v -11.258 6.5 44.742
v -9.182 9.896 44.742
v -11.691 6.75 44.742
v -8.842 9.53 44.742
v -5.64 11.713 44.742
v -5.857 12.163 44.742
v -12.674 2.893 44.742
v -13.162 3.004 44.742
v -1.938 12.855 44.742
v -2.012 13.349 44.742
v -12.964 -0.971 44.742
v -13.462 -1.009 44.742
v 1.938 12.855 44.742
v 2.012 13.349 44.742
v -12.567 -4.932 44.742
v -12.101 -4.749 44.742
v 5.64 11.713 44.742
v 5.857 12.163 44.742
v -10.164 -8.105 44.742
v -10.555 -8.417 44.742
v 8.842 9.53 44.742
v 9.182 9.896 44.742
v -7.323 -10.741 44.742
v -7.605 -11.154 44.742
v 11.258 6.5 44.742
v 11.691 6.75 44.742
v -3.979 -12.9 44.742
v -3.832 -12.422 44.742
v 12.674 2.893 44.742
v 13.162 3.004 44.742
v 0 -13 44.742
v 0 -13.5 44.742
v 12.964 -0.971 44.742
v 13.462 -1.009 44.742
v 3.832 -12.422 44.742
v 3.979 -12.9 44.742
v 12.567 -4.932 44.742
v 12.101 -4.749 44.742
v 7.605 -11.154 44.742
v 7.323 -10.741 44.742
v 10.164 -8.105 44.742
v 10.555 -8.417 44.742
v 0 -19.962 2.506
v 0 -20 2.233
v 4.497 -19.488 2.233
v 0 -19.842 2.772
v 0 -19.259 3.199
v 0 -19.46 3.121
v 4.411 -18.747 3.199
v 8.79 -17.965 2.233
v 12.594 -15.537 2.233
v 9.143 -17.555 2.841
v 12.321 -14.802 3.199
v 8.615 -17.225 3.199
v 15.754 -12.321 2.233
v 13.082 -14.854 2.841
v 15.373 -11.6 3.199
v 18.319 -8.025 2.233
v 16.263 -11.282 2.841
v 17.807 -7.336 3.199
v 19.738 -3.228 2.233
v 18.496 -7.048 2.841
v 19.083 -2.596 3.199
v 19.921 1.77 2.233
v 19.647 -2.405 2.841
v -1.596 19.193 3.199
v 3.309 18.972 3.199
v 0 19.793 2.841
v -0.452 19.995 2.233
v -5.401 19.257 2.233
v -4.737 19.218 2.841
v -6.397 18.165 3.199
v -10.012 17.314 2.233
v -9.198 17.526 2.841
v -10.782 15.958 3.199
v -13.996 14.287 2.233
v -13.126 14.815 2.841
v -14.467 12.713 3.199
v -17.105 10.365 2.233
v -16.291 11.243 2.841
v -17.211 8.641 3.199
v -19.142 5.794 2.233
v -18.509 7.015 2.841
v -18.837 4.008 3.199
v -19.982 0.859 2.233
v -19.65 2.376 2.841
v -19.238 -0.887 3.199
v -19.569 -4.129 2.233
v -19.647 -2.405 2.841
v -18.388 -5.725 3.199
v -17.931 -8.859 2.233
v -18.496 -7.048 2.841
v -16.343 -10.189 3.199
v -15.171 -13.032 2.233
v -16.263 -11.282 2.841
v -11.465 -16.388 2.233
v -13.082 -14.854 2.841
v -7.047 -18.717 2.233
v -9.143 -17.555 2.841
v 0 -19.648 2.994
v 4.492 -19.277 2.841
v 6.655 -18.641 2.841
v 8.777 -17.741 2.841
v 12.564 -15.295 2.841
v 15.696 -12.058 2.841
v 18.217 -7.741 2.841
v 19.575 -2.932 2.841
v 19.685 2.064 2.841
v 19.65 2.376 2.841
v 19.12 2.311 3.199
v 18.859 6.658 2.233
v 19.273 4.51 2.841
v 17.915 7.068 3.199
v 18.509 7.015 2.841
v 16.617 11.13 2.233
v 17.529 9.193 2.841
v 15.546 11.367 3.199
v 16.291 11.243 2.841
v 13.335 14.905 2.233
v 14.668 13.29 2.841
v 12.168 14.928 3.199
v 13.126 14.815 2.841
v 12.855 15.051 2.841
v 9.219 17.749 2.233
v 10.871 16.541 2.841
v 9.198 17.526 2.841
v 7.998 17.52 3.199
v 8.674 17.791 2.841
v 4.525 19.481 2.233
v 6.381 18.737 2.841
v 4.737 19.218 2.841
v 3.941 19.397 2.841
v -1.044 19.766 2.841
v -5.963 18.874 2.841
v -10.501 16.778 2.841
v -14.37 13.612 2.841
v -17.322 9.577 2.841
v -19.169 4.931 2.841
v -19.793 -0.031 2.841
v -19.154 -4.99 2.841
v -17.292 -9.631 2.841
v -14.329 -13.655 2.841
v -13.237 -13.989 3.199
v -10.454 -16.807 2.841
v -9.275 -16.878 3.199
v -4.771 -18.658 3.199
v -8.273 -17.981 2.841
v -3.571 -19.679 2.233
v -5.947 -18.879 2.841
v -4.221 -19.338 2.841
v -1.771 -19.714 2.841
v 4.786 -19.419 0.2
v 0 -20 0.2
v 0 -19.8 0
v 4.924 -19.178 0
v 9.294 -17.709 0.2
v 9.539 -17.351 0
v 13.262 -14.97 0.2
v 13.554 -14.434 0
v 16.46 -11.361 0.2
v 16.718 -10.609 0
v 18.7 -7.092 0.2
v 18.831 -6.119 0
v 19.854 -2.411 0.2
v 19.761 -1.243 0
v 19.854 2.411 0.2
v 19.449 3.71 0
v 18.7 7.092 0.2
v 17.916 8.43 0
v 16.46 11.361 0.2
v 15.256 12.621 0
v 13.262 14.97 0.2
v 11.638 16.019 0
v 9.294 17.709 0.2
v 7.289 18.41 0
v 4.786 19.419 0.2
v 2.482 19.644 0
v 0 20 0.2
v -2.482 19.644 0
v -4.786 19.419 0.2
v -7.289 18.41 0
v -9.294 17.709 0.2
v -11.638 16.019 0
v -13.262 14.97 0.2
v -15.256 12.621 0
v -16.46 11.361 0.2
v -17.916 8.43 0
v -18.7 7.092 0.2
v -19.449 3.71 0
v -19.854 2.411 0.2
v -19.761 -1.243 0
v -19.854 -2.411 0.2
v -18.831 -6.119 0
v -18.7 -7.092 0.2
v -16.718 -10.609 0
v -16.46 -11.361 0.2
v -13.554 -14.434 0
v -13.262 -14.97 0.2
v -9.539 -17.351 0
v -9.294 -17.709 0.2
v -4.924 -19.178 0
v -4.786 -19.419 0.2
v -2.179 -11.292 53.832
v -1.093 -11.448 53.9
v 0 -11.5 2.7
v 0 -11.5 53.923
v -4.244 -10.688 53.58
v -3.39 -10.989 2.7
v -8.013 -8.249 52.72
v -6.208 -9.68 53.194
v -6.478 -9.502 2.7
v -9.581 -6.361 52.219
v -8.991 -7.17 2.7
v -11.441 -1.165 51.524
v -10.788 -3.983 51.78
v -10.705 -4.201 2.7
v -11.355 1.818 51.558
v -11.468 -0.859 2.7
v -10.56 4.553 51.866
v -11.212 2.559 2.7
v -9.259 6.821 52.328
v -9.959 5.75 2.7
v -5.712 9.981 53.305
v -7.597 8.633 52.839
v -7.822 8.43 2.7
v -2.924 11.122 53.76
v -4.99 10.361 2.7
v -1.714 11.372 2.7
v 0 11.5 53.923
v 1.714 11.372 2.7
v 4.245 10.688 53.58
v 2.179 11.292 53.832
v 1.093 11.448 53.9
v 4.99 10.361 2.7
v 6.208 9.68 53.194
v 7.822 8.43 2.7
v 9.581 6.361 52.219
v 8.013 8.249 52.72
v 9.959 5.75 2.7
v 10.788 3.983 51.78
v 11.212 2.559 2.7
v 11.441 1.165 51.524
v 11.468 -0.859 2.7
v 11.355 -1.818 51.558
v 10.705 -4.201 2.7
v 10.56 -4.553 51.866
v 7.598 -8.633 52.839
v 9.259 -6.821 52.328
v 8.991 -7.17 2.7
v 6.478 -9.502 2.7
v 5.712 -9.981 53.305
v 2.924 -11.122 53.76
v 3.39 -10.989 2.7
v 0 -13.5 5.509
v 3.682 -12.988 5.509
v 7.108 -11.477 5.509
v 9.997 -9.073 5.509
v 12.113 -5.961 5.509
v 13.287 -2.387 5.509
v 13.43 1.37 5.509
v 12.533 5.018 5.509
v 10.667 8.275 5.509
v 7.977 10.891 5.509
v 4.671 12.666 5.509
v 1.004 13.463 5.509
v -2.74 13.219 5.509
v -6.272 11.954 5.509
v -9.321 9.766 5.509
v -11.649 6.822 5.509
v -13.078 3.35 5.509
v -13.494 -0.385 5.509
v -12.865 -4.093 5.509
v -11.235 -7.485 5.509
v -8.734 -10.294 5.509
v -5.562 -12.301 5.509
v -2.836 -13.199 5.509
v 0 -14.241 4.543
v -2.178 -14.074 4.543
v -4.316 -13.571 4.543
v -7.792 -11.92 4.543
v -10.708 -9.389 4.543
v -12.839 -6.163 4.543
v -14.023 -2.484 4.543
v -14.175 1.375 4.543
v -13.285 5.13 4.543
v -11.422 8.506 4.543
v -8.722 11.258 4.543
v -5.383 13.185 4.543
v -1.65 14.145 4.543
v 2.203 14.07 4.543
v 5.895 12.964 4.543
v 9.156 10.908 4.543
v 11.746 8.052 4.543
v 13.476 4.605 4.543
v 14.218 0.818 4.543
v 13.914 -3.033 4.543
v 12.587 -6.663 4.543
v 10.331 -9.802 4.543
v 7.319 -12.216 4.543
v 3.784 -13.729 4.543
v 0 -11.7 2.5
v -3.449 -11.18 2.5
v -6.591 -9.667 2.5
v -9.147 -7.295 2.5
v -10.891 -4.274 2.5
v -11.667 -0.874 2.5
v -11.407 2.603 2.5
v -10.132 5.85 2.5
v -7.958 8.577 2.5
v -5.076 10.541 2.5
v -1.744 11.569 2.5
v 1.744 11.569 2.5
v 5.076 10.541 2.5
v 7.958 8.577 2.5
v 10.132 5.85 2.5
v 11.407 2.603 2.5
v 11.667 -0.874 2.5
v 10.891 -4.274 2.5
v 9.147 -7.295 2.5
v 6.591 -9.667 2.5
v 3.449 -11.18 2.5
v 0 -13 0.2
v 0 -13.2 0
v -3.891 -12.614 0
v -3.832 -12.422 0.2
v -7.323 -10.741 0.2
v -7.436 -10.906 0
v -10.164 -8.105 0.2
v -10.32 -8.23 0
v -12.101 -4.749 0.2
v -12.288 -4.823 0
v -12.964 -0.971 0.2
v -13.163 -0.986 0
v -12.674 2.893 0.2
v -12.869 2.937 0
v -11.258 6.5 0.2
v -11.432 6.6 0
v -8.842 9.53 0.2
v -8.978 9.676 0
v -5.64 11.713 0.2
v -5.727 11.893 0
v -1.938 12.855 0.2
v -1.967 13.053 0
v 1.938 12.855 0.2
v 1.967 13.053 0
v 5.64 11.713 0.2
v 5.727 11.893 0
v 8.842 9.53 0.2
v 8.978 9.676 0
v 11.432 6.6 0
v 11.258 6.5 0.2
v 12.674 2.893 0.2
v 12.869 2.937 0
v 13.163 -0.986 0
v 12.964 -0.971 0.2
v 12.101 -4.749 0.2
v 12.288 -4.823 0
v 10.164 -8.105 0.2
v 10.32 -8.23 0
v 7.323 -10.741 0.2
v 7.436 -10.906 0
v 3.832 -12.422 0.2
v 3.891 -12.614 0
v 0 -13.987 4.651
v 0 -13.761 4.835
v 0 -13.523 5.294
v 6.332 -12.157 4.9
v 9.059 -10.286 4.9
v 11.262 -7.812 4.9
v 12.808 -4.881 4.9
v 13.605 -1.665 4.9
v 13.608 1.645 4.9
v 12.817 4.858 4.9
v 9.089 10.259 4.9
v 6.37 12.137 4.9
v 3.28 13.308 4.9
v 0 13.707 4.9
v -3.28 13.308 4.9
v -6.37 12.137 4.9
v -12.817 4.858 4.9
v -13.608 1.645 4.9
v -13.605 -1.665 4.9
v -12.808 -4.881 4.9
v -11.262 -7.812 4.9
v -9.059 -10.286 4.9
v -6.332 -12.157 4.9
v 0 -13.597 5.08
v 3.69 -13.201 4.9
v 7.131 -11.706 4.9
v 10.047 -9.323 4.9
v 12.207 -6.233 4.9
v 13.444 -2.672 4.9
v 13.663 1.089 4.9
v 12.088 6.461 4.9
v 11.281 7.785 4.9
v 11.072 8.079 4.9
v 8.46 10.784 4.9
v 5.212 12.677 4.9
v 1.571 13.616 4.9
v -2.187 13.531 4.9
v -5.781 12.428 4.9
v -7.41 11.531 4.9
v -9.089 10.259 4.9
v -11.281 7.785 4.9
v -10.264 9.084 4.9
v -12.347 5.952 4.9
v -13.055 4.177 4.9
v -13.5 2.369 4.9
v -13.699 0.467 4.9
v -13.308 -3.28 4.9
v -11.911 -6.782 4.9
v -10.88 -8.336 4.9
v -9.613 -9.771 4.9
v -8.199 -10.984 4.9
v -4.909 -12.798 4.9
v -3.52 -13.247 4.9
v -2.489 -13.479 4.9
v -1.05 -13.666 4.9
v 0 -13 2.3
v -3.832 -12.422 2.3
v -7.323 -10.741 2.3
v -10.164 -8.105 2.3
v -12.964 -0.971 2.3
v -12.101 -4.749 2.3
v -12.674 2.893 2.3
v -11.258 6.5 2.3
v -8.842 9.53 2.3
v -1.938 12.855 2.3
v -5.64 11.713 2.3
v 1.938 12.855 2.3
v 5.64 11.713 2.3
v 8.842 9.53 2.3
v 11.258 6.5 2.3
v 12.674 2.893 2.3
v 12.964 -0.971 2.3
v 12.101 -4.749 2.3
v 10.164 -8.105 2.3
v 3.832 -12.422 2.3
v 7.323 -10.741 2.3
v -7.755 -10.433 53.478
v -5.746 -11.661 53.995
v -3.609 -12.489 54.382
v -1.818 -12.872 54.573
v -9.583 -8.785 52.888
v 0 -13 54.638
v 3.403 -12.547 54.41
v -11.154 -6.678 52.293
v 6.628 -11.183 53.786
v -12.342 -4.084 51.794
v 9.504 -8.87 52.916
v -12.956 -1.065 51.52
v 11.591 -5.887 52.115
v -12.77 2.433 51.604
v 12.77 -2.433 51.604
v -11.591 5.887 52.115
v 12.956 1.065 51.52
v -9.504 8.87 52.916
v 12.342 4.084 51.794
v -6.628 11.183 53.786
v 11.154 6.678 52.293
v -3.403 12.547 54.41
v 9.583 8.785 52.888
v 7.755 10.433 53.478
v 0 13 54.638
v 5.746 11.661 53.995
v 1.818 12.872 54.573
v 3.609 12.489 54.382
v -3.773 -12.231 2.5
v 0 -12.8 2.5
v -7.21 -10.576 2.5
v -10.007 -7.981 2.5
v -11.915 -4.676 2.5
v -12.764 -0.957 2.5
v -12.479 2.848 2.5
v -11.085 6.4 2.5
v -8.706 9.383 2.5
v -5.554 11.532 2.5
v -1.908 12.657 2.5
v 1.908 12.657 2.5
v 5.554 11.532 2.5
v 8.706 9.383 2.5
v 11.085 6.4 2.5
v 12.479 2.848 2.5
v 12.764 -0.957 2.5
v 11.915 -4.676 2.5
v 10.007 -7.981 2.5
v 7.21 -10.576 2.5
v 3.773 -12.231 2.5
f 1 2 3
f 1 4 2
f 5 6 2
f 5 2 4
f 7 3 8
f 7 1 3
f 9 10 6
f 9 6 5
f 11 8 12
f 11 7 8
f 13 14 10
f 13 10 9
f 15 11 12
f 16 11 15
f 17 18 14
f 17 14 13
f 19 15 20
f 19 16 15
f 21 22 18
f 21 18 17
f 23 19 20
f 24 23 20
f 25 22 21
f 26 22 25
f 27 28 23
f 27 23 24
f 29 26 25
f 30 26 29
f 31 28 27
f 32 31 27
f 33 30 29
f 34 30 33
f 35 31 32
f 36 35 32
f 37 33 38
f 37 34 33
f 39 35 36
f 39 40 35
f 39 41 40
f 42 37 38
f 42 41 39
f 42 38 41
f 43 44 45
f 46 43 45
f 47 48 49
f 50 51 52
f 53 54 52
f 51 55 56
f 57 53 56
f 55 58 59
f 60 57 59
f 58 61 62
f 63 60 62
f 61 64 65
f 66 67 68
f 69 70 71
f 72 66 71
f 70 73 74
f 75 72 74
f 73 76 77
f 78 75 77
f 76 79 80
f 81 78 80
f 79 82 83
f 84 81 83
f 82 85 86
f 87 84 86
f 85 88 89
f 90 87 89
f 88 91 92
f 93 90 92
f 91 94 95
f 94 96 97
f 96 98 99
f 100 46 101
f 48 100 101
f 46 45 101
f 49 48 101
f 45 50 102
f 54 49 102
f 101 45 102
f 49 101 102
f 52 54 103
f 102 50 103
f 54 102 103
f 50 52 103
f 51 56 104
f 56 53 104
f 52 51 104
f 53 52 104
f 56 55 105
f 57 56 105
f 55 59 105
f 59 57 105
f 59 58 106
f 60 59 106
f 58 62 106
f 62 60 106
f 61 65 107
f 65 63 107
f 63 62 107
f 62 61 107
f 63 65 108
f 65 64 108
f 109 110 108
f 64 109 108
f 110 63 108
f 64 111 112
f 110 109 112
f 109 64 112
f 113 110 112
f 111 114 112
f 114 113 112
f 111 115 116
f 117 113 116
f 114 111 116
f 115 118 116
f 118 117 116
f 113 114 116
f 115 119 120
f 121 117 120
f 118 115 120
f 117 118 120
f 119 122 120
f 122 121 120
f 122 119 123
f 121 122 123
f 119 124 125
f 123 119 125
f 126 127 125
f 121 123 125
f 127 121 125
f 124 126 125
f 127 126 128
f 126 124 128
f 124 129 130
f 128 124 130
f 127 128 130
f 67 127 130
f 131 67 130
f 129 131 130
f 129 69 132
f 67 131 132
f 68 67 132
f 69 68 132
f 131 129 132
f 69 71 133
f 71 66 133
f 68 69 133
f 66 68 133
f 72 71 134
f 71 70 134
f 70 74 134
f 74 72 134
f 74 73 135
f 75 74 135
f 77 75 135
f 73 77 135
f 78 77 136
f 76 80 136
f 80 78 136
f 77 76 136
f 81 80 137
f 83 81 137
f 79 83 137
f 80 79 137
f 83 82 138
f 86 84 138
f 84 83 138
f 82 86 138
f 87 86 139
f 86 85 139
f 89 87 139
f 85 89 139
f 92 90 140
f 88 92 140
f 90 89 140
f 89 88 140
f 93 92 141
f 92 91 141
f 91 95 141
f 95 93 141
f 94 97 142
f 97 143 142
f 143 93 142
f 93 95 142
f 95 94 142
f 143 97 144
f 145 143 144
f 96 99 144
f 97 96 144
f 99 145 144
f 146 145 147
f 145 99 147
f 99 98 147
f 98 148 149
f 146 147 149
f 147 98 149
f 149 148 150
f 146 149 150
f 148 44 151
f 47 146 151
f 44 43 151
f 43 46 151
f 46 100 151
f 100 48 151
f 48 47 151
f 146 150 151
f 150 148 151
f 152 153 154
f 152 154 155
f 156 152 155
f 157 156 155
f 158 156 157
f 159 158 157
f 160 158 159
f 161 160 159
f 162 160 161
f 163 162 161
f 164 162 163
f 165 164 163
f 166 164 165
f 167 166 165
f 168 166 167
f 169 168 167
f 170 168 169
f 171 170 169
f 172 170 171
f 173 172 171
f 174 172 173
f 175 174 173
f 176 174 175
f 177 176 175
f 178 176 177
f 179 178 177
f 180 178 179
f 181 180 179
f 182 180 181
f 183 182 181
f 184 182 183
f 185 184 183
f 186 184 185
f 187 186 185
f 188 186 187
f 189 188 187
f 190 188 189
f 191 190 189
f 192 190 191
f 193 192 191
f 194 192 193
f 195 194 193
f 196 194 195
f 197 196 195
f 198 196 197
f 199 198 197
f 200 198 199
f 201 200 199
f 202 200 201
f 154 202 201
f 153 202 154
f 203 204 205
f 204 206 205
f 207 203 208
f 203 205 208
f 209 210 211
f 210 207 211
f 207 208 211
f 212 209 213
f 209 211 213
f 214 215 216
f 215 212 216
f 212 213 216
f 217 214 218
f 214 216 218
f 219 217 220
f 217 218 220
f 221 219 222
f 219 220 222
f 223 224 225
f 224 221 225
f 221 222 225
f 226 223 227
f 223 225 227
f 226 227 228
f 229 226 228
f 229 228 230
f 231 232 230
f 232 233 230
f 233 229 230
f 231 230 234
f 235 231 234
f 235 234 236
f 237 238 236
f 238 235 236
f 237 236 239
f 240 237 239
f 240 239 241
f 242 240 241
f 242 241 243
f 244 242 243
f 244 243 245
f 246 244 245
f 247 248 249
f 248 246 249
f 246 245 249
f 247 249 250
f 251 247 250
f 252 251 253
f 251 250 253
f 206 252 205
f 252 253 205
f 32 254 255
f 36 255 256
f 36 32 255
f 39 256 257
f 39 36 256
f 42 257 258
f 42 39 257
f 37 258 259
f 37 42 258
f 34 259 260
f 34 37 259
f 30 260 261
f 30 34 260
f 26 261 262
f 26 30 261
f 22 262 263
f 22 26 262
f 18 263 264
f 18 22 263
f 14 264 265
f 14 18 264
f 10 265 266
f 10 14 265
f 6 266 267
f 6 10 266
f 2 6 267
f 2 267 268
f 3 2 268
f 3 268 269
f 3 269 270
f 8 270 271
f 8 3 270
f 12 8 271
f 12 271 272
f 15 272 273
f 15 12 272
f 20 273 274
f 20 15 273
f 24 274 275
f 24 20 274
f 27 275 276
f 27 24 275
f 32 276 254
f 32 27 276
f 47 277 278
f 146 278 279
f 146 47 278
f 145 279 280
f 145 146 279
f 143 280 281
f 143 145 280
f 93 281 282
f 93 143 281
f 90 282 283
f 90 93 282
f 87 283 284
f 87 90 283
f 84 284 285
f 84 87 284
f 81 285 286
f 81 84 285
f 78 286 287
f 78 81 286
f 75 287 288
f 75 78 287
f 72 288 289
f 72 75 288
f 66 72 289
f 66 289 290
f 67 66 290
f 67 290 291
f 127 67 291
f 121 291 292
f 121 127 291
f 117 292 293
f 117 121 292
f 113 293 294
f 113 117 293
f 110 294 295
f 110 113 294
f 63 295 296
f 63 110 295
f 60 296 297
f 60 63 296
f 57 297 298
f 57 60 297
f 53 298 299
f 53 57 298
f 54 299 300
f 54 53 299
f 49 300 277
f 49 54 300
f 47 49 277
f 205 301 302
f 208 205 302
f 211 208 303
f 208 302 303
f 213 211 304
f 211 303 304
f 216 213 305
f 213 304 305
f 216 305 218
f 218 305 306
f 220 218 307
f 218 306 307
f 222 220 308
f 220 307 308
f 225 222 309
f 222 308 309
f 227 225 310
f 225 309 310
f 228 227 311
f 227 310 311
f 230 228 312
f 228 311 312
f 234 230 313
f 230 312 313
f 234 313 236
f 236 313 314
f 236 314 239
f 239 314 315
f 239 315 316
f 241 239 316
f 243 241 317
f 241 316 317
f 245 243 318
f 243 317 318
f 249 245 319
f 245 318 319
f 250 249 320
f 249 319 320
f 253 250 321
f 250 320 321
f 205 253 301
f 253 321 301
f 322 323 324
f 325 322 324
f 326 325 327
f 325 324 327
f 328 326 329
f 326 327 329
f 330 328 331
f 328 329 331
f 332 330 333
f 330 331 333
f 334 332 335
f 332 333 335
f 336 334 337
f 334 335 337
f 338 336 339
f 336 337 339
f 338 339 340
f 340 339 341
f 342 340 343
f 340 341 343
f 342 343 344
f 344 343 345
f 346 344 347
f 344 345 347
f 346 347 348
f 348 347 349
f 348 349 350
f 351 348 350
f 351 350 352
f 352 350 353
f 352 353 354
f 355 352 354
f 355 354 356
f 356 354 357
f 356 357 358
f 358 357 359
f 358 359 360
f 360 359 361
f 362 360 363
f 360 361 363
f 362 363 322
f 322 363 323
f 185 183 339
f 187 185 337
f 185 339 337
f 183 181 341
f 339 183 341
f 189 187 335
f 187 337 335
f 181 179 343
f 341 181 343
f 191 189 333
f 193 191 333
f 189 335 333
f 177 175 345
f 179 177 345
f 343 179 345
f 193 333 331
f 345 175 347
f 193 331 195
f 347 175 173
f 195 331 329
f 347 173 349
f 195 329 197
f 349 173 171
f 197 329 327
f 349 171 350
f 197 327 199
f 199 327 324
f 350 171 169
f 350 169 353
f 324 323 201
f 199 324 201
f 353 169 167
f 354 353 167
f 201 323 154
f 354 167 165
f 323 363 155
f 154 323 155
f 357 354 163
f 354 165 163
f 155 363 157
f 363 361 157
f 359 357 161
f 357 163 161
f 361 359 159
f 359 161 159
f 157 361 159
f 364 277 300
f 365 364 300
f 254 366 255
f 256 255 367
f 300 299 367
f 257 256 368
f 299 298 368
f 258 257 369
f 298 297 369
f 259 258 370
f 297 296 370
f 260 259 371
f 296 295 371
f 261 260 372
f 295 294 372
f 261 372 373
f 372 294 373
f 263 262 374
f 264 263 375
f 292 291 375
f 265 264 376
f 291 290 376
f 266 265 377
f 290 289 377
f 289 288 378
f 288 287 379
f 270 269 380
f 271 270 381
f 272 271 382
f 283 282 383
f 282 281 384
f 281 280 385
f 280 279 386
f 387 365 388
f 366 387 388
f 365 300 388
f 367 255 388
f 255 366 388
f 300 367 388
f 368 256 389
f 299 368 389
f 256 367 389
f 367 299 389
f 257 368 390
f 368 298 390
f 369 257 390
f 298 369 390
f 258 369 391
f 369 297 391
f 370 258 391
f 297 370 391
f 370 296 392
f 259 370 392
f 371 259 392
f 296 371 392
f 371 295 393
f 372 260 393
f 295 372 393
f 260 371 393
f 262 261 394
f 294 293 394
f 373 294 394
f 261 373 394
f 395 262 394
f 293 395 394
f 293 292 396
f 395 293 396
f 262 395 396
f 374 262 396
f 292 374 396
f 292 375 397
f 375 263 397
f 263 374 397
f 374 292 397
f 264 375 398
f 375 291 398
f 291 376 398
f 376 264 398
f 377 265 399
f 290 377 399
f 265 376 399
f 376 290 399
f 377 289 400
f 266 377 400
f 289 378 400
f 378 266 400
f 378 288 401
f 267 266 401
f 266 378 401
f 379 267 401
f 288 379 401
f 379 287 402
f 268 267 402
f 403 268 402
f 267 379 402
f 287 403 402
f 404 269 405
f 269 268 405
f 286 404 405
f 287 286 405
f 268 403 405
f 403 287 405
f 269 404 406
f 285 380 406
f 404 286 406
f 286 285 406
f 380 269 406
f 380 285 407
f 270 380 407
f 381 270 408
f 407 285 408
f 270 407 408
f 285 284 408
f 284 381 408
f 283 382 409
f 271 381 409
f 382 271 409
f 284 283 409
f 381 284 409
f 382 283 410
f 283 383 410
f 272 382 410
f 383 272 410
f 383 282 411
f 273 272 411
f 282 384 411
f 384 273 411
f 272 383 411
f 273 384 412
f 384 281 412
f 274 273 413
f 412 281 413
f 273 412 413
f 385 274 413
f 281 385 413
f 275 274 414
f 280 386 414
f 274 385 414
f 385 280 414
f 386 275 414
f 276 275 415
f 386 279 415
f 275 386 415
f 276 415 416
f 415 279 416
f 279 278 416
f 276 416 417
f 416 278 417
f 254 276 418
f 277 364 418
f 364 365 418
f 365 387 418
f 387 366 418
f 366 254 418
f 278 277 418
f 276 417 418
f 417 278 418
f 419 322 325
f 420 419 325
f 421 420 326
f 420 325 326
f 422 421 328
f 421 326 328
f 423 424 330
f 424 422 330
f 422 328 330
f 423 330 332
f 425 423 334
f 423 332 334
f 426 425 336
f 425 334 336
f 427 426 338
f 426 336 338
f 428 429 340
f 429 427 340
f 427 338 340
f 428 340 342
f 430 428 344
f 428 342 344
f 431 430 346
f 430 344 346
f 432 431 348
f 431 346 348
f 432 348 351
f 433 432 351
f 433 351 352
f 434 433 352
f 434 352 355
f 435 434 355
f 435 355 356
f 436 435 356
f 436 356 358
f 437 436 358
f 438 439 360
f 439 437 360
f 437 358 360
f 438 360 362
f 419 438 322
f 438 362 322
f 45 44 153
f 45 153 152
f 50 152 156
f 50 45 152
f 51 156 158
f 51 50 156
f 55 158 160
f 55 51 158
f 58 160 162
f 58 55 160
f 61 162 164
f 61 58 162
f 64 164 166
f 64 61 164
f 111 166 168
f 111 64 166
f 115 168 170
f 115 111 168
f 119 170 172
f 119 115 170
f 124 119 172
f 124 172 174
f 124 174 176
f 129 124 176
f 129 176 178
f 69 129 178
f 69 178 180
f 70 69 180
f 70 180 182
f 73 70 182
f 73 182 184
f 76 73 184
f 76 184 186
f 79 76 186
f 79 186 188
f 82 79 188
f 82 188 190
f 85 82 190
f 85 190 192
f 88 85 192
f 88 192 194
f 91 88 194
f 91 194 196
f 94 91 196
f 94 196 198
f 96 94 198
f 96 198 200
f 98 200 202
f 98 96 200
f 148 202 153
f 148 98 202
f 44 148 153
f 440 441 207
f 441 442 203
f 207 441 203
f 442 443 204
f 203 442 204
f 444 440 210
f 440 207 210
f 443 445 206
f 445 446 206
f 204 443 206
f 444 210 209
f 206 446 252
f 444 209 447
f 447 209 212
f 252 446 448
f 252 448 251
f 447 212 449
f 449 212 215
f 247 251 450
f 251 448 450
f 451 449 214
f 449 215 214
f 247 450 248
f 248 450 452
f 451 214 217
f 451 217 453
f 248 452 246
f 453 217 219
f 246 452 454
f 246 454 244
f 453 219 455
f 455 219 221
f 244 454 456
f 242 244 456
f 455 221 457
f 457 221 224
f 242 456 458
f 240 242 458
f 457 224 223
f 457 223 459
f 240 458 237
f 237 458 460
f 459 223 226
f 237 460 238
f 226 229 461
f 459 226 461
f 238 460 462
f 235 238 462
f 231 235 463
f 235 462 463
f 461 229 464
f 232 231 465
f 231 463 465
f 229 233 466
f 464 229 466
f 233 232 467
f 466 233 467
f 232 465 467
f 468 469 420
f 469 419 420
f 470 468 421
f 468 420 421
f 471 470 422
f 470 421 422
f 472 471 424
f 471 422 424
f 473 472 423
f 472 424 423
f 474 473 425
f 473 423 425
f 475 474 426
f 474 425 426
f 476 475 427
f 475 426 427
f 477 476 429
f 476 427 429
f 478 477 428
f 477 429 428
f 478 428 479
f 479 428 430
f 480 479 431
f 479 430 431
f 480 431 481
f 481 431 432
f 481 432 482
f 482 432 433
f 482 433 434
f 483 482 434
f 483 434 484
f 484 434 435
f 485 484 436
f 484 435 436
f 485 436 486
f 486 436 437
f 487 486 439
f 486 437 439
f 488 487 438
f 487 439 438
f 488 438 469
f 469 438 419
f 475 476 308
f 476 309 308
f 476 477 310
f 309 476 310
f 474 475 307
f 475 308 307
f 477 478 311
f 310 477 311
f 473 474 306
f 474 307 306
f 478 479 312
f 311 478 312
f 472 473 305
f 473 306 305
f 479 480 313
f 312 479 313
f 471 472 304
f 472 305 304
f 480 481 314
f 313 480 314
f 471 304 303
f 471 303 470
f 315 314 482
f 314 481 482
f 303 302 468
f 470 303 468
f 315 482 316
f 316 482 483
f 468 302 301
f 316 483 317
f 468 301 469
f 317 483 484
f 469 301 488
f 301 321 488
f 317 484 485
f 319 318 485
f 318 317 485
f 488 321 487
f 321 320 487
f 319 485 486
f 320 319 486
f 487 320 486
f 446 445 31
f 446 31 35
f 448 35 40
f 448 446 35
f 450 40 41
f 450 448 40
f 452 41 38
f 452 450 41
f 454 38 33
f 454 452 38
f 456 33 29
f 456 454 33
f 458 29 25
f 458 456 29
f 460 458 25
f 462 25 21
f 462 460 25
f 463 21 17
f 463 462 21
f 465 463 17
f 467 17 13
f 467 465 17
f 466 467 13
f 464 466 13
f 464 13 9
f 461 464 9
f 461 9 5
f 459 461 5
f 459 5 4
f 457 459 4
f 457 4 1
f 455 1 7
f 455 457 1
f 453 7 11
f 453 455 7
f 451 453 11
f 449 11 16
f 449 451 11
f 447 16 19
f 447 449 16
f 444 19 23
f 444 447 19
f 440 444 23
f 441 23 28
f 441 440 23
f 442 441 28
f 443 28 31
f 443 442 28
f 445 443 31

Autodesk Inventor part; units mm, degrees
ref_plane "YZ Plane" through (0, 0, 0) normal (1, 0, 0) x (0, 1, 0)
ref_plane "XZ Plane" through (0, 0, 0) normal (0, 1, 0) x (-1, 0, 0)
ref_plane "XY Plane" through (0, 0, 0) normal (0, 0, 1) x (1, 0, 0)
sketch "Sketch1" plane through (0, 0, 0) normal (1, 0, 0) x (0, 1, 0)
  line L0 (0, 0) -> (0, 56)
  line L1 (-11.5, 56) -> (-11.5, 2.5)
  line L2 (-11.5, 2.5) -> (-13, 2.5)
  line L3 (-13, 2.5) -> (-13, 0)
  line L4 (-13, 0) -> (-20, 0)
  line L5 (-20, 0) -> (-20, 3)
  line L6 (-20, 3) -> (-13.5, 4.7417)
  line L7 (-13.5, 4.7417) -> (-13.5, 44.7417)
  line L8 (-13.5, 44.7417) -> (-13, 44.7417)
  line L9 (-13, 44.7417) -> (-13, 56)
  line L10 (-13, 56) -> (-11.5, 56)
  dimension "d0" = 56
  dimension "d1" = 27
  dimension "d2" = 26
  dimension "d3" = 2.5
  dimension "d4" = 23
  dimension "d5" = 15
  dimension "d6" = 3
  dimension "d7" = 40
  dimension "d8" = 26
  dimension "d10" = 40
revolve "Revolution1" add sketch "Sketch1" angle 360 about axis through (0, 0, 0) along (0, 0, 1)
fillet "Fillet1" radius 1 2 edges at (0, 20, 3) (0, 13.5, 4.7417)
sketch "Sketch2" plane through (0, 0, 0) normal (1, 0, 0) x (0, 1, 0)
  circle A0 centre (0, 80) radius 28.5
  line L0 (20, 0) -> (-20, 0) projected
  point P0 (0, 0)
  dimension "d13" = 57
  dimension "d14" = 80
extrude "Extrusion1" cut sketch "Sketch2" along normal through all both and the other way through all
chamfer "Chamfer1" distance 0.2 angle 45 4 edges at (0, 20, 0) (0, 13, 0) (0, 11.5, 2.5) (0, 13, 2.5)
properties part number "pld_vessel_kf_nipple" material "Stainless Steel"
